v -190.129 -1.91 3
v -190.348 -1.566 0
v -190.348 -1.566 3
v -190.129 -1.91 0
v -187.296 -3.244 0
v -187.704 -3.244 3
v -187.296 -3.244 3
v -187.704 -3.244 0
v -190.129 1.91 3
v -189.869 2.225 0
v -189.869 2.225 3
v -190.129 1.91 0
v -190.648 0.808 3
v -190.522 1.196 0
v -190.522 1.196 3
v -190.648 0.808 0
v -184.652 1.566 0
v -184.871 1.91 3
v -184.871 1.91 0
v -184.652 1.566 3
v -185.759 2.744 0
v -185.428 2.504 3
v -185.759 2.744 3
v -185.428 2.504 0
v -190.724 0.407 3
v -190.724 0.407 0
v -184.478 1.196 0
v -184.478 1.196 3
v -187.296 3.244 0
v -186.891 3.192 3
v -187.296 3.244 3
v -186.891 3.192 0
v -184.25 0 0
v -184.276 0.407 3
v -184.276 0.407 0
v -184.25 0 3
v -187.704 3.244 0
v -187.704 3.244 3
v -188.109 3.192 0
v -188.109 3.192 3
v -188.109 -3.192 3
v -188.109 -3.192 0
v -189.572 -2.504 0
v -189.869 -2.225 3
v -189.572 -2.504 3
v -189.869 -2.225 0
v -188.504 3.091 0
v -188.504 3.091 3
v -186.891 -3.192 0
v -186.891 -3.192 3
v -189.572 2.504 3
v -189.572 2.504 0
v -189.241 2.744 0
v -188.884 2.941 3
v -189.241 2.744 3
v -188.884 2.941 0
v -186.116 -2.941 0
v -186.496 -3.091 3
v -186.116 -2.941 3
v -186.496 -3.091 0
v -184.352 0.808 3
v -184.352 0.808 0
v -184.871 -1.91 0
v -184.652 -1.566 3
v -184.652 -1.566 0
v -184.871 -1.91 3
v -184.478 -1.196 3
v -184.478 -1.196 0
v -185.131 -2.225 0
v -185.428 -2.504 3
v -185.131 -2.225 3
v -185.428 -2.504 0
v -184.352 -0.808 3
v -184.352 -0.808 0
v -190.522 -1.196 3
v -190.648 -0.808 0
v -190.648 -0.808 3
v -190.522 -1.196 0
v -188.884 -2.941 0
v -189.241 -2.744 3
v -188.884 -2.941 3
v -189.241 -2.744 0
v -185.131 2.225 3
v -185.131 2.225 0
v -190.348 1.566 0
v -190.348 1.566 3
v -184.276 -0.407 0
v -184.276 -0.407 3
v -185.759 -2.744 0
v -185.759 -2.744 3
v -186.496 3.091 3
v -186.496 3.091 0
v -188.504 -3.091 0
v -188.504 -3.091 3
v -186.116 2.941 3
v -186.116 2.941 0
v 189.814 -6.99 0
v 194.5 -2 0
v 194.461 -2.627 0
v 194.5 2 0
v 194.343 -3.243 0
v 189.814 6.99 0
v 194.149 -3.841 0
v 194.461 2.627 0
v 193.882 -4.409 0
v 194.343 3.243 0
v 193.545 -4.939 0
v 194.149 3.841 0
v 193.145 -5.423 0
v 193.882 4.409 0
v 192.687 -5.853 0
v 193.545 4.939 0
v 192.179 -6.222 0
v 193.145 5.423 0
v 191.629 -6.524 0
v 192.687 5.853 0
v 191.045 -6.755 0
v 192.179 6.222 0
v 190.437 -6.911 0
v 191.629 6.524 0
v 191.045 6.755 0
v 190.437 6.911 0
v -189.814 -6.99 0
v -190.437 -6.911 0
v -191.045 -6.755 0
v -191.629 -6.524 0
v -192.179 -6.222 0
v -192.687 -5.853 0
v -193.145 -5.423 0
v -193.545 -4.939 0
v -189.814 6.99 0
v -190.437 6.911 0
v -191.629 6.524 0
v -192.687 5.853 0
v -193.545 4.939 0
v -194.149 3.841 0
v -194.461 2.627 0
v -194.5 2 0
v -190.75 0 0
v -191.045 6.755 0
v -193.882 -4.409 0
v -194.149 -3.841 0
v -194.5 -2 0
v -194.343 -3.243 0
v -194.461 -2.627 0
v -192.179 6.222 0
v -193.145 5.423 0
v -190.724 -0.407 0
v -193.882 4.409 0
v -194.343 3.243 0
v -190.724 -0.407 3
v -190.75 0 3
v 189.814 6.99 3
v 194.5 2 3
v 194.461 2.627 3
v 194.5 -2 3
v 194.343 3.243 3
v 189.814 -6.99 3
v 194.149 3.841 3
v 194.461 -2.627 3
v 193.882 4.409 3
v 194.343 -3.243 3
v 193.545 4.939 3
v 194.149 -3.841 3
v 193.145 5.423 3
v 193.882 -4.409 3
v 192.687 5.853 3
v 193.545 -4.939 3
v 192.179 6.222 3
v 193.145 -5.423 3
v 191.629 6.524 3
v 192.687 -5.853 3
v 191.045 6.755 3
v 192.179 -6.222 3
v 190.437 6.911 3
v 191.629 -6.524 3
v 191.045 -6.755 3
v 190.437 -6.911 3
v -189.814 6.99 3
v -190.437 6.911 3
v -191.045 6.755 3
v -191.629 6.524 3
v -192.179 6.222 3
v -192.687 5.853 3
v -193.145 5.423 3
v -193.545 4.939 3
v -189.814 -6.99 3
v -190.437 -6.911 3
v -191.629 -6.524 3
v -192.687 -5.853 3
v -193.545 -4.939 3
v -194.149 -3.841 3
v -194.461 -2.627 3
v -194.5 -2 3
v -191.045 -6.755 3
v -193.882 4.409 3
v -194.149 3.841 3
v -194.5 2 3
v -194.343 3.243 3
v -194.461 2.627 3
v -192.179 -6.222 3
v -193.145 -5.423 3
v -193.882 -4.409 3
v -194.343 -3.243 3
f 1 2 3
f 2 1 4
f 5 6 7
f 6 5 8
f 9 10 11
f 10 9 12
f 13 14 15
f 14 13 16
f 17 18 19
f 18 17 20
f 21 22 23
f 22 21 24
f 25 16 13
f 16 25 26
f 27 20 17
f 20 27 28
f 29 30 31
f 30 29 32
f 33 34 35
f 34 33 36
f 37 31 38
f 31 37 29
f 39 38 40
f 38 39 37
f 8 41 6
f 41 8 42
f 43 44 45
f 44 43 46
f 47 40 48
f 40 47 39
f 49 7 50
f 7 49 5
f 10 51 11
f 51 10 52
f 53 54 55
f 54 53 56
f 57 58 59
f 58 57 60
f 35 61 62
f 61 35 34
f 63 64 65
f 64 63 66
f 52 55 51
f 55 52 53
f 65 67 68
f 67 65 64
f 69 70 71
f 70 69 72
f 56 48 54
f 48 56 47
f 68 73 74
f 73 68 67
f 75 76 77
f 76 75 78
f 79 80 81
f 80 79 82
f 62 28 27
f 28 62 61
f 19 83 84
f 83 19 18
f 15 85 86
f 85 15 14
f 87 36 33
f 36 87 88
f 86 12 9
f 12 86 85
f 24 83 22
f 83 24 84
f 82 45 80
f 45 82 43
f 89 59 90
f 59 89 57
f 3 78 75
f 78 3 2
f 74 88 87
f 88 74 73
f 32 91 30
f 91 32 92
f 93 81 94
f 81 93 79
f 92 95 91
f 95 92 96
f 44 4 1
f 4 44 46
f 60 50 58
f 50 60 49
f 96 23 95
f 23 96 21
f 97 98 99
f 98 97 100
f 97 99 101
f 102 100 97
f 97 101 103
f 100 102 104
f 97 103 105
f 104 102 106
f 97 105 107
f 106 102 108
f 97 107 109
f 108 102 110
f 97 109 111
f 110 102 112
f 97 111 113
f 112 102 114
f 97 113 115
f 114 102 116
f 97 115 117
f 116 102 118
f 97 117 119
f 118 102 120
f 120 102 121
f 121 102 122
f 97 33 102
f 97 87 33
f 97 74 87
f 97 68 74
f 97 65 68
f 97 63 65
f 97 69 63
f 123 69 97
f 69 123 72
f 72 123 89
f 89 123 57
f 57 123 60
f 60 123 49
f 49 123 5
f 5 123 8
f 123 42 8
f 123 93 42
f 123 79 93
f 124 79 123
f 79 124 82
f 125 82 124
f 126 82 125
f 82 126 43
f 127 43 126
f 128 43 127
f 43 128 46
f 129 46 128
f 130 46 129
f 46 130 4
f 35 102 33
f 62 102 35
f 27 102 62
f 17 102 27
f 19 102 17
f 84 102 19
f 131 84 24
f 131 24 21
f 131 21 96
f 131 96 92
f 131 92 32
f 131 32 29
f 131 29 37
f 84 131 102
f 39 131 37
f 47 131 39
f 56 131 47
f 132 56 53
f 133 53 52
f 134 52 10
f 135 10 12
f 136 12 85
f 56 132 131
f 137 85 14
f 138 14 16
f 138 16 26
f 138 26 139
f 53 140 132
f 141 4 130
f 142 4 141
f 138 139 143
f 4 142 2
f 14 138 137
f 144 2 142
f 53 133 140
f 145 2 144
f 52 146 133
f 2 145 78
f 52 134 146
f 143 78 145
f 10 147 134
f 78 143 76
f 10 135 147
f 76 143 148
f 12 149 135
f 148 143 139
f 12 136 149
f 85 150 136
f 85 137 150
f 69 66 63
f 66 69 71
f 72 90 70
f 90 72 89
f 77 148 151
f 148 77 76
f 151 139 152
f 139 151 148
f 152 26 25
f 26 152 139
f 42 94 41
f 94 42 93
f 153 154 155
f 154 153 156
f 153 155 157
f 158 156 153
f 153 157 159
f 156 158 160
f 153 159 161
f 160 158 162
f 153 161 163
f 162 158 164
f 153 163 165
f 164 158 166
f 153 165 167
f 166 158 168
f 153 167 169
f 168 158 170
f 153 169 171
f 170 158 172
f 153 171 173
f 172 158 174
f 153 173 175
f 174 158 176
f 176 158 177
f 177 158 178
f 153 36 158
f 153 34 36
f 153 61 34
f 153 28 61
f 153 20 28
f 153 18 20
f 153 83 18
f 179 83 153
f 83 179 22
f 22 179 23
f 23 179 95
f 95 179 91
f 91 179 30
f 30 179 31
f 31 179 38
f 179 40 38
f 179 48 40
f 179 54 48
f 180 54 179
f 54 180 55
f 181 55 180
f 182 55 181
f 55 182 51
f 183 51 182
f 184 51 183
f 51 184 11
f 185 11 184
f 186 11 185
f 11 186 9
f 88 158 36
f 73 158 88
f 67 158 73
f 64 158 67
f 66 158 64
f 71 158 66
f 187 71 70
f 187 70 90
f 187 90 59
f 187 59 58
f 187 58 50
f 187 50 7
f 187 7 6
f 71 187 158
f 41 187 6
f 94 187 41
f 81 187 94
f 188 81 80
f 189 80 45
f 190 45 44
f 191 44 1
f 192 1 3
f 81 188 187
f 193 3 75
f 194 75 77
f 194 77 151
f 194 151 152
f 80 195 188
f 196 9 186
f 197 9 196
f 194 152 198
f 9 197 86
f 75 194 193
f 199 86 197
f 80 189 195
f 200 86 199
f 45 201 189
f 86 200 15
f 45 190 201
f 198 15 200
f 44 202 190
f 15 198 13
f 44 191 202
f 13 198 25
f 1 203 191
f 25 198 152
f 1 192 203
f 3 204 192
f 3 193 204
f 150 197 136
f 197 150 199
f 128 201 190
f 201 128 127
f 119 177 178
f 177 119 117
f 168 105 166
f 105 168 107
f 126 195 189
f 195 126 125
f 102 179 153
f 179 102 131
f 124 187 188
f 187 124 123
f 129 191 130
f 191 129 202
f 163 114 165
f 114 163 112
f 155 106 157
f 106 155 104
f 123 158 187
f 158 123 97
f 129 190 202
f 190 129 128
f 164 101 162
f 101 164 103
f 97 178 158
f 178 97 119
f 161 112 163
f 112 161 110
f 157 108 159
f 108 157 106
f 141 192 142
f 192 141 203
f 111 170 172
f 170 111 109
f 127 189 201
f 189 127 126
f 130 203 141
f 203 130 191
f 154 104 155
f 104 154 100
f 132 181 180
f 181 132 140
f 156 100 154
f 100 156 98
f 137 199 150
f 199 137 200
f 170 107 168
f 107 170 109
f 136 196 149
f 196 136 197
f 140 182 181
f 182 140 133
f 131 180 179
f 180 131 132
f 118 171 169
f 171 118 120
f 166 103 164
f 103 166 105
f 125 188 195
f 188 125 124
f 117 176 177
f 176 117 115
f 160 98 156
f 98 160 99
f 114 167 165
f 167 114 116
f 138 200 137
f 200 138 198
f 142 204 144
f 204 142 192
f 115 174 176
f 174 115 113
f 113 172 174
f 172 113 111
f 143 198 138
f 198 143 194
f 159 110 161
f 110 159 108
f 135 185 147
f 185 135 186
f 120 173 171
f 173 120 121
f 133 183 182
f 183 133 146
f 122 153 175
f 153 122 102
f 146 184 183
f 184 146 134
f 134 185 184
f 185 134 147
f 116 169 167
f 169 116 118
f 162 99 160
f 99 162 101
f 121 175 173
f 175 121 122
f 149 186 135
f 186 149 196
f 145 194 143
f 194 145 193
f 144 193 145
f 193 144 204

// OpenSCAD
$fn = 50;


difference() {
	union() {
		hull() {
			translate(v = [-189.5000000000, 2.0000000000, 0]) {
				cylinder(h = 3, r = 5);
			}
			translate(v = [189.5000000000, 2.0000000000, 0]) {
				cylinder(h = 3, r = 5);
			}
			translate(v = [-189.5000000000, -2.0000000000, 0]) {
				cylinder(h = 3, r = 5);
			}
			translate(v = [189.5000000000, -2.0000000000, 0]) {
				cylinder(h = 3, r = 5);
			}
		}
	}
	union() {
		translate(v = [-187.5000000000, 0.0000000000, 0]) {
			cylinder(h = 3, r = 3.2500000000);
		}
		translate(v = [-187.5000000000, 0.0000000000, 0]) {
			cylinder(h = 3, r = 1.8000000000);
		}
		translate(v = [-187.5000000000, 0.0000000000, 0]) {
			cylinder(h = 3, r = 1.8000000000);
		}
		translate(v = [-187.5000000000, 0.0000000000, 0]) {
			cylinder(h = 3, r = 1.8000000000);
		}
	}
}
